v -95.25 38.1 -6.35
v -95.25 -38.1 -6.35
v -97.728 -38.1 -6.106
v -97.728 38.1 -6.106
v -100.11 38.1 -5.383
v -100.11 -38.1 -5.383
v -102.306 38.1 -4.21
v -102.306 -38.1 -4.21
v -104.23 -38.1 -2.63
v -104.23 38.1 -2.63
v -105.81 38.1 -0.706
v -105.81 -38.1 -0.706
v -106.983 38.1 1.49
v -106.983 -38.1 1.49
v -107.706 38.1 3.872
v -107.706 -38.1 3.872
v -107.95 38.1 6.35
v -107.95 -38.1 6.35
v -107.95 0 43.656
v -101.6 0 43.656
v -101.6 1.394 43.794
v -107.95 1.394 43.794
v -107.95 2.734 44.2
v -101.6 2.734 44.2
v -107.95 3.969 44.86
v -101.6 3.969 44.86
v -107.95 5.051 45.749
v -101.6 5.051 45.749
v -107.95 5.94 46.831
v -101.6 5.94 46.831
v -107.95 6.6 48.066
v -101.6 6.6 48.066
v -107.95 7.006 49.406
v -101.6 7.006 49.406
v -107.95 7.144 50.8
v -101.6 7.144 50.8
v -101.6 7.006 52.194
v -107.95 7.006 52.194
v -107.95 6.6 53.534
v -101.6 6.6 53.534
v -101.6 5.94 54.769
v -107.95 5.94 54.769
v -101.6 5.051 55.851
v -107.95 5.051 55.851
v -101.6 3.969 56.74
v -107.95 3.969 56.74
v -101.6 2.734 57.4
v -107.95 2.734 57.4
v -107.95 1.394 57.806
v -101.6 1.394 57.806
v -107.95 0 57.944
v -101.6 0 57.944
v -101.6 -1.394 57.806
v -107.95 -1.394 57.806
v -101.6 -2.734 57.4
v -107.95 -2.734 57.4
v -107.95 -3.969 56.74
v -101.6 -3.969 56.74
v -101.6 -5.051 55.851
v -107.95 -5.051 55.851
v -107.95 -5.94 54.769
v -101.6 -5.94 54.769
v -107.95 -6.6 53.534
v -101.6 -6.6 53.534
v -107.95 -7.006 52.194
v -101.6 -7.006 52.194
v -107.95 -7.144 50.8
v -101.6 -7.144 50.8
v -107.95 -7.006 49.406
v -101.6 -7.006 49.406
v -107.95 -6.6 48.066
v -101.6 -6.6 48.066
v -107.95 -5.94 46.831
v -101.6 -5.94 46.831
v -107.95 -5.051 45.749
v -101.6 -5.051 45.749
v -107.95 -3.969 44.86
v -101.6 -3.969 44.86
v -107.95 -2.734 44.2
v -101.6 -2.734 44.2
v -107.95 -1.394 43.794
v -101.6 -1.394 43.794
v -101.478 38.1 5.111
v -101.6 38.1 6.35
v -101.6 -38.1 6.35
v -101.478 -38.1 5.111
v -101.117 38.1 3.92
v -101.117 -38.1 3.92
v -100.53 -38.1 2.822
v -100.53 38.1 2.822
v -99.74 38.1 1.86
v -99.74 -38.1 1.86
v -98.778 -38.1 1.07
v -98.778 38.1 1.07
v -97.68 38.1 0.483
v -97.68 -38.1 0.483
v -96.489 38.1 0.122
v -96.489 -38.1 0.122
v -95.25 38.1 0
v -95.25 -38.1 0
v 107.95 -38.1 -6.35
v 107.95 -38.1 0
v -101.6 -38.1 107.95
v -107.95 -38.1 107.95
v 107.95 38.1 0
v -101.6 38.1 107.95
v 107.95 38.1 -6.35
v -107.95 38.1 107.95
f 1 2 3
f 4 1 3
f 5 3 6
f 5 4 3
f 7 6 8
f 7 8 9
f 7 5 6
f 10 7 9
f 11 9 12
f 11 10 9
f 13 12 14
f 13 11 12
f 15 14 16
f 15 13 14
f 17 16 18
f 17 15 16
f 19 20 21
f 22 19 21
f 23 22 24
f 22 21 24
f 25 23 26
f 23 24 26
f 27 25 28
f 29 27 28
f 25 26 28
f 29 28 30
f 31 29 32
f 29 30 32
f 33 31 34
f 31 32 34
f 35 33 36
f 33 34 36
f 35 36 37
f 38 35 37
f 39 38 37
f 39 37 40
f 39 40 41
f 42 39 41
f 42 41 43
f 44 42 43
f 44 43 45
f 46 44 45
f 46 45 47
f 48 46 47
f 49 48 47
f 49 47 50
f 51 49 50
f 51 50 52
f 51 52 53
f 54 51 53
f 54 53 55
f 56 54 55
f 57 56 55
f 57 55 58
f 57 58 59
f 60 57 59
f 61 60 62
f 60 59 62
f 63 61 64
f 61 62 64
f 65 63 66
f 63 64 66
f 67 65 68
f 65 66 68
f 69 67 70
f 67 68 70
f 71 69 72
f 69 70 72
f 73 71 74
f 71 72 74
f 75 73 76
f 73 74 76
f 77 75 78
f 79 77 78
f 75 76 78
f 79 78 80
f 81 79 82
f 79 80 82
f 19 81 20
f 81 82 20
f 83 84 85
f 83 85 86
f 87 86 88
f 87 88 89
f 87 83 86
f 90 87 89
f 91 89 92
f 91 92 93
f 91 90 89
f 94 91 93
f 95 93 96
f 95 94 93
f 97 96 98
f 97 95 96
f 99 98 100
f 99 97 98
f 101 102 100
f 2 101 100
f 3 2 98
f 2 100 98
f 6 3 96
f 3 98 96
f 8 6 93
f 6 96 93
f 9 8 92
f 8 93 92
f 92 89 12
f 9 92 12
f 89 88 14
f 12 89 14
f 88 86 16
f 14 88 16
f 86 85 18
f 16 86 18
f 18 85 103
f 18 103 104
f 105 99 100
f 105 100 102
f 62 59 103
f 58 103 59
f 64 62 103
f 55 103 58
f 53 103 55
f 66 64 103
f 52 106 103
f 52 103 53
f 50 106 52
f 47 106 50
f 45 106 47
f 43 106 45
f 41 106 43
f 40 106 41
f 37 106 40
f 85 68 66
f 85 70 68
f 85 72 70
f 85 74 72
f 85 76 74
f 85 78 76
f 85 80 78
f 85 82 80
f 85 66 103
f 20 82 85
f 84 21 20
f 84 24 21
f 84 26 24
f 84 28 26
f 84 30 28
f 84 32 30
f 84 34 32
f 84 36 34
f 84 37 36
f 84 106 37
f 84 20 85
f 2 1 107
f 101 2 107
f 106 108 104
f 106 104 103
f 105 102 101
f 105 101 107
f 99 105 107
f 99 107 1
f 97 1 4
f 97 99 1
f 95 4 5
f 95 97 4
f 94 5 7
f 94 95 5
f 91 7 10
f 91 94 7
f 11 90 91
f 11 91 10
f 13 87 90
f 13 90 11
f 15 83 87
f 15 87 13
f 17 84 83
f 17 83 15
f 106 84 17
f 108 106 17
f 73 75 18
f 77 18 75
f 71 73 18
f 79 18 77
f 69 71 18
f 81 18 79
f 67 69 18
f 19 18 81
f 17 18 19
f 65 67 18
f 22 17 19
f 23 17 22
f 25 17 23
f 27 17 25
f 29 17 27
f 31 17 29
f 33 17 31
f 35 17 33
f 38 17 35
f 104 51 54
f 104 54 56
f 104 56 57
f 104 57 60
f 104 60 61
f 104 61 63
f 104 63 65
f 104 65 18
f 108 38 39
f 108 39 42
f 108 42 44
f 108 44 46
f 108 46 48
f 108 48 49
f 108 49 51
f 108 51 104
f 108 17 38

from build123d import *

# Parameters (mm, degrees)
SKETCH19_W                   = 215.9
SKETCH19_H                   = 76.2
BASE_FLANGE2_DEPTH           = 6.35
EDGE_FLANGE4_STRIP_W         = 38.1
EDGE_FLANGE4_STRIP_H         = 6.35
EDGE_FLANGE4_STRIP_CUT_DEPTH = 76.2
EDGE_FLANGE4_DEPTH           = 76.2
CUT_EXTRUDE1_REACH           = 240.78
SKETCH27_R                   = 7.14375


# Sheet-metal steps are written as plain solids
with BuildPart() as part:
    # Sketch19 → Base-Flange2 (new body)
    with BuildSketch(Plane.XY):
        Rectangle(SKETCH19_W, SKETCH19_H)
    extrude(amount=-BASE_FLANGE2_DEPTH)

    # Edge-Flange4 strip (across the edge) → Edge-Flange4 strip cut (cut)
    with BuildSketch(Plane(origin=(-107.95, 38.1, 0), x_dir=(1, 0, 0), z_dir=(0, -1, 0))):
        with Locations((-6.35, -3.175)):
            Rectangle(EDGE_FLANGE4_STRIP_W, EDGE_FLANGE4_STRIP_H)
    extrude(amount=EDGE_FLANGE4_STRIP_CUT_DEPTH, mode=Mode.SUBTRACT)

    # Edge-Flange4 section (across the edge) → Edge-Flange4 (add)
    with BuildSketch(Plane(origin=(-107.95, 38.1, 0), x_dir=(1, 0, 0), z_dir=(0, -1, 0))):
        with BuildLine():
            Line((0, 6.35), (0, 107.95))
            Line((0, 107.95), (6.35, 107.95))
            Line((6.35, 107.95), (6.35, 6.35))
            ThreePointArc((6.35, 6.35), (8.209871939, 1.859871939), (12.7, 0))
            Line((12.7, 0), (12.7, -6.35))
            ThreePointArc((12.7, -6.35), (3.719743879, -2.630256121), (0, 6.35))
        make_face()
    extrude(amount=EDGE_FLANGE4_DEPTH)

    # Sketch27 → Cut-Extrude1 (cut, up to next)
    with BuildSketch(Plane(origin=(-101.6, 0, 0), x_dir=(0, 0, -1), z_dir=(1, 0, 0)), mode=Mode.PRIVATE) as cut_extrude1_sk1:
        with Locations((-50.8, 0)):
            Circle(SKETCH27_R)
    cut_extrude1_tool1 = extrude(cut_extrude1_sk1.sketch, amount=-CUT_EXTRUDE1_REACH, mode=Mode.PRIVATE) & part.part
    add(cut_extrude1_tool1.solids().sort_by_distance((-101.6, 0, 50.8))[0], mode=Mode.SUBTRACT)


solid = part.part
